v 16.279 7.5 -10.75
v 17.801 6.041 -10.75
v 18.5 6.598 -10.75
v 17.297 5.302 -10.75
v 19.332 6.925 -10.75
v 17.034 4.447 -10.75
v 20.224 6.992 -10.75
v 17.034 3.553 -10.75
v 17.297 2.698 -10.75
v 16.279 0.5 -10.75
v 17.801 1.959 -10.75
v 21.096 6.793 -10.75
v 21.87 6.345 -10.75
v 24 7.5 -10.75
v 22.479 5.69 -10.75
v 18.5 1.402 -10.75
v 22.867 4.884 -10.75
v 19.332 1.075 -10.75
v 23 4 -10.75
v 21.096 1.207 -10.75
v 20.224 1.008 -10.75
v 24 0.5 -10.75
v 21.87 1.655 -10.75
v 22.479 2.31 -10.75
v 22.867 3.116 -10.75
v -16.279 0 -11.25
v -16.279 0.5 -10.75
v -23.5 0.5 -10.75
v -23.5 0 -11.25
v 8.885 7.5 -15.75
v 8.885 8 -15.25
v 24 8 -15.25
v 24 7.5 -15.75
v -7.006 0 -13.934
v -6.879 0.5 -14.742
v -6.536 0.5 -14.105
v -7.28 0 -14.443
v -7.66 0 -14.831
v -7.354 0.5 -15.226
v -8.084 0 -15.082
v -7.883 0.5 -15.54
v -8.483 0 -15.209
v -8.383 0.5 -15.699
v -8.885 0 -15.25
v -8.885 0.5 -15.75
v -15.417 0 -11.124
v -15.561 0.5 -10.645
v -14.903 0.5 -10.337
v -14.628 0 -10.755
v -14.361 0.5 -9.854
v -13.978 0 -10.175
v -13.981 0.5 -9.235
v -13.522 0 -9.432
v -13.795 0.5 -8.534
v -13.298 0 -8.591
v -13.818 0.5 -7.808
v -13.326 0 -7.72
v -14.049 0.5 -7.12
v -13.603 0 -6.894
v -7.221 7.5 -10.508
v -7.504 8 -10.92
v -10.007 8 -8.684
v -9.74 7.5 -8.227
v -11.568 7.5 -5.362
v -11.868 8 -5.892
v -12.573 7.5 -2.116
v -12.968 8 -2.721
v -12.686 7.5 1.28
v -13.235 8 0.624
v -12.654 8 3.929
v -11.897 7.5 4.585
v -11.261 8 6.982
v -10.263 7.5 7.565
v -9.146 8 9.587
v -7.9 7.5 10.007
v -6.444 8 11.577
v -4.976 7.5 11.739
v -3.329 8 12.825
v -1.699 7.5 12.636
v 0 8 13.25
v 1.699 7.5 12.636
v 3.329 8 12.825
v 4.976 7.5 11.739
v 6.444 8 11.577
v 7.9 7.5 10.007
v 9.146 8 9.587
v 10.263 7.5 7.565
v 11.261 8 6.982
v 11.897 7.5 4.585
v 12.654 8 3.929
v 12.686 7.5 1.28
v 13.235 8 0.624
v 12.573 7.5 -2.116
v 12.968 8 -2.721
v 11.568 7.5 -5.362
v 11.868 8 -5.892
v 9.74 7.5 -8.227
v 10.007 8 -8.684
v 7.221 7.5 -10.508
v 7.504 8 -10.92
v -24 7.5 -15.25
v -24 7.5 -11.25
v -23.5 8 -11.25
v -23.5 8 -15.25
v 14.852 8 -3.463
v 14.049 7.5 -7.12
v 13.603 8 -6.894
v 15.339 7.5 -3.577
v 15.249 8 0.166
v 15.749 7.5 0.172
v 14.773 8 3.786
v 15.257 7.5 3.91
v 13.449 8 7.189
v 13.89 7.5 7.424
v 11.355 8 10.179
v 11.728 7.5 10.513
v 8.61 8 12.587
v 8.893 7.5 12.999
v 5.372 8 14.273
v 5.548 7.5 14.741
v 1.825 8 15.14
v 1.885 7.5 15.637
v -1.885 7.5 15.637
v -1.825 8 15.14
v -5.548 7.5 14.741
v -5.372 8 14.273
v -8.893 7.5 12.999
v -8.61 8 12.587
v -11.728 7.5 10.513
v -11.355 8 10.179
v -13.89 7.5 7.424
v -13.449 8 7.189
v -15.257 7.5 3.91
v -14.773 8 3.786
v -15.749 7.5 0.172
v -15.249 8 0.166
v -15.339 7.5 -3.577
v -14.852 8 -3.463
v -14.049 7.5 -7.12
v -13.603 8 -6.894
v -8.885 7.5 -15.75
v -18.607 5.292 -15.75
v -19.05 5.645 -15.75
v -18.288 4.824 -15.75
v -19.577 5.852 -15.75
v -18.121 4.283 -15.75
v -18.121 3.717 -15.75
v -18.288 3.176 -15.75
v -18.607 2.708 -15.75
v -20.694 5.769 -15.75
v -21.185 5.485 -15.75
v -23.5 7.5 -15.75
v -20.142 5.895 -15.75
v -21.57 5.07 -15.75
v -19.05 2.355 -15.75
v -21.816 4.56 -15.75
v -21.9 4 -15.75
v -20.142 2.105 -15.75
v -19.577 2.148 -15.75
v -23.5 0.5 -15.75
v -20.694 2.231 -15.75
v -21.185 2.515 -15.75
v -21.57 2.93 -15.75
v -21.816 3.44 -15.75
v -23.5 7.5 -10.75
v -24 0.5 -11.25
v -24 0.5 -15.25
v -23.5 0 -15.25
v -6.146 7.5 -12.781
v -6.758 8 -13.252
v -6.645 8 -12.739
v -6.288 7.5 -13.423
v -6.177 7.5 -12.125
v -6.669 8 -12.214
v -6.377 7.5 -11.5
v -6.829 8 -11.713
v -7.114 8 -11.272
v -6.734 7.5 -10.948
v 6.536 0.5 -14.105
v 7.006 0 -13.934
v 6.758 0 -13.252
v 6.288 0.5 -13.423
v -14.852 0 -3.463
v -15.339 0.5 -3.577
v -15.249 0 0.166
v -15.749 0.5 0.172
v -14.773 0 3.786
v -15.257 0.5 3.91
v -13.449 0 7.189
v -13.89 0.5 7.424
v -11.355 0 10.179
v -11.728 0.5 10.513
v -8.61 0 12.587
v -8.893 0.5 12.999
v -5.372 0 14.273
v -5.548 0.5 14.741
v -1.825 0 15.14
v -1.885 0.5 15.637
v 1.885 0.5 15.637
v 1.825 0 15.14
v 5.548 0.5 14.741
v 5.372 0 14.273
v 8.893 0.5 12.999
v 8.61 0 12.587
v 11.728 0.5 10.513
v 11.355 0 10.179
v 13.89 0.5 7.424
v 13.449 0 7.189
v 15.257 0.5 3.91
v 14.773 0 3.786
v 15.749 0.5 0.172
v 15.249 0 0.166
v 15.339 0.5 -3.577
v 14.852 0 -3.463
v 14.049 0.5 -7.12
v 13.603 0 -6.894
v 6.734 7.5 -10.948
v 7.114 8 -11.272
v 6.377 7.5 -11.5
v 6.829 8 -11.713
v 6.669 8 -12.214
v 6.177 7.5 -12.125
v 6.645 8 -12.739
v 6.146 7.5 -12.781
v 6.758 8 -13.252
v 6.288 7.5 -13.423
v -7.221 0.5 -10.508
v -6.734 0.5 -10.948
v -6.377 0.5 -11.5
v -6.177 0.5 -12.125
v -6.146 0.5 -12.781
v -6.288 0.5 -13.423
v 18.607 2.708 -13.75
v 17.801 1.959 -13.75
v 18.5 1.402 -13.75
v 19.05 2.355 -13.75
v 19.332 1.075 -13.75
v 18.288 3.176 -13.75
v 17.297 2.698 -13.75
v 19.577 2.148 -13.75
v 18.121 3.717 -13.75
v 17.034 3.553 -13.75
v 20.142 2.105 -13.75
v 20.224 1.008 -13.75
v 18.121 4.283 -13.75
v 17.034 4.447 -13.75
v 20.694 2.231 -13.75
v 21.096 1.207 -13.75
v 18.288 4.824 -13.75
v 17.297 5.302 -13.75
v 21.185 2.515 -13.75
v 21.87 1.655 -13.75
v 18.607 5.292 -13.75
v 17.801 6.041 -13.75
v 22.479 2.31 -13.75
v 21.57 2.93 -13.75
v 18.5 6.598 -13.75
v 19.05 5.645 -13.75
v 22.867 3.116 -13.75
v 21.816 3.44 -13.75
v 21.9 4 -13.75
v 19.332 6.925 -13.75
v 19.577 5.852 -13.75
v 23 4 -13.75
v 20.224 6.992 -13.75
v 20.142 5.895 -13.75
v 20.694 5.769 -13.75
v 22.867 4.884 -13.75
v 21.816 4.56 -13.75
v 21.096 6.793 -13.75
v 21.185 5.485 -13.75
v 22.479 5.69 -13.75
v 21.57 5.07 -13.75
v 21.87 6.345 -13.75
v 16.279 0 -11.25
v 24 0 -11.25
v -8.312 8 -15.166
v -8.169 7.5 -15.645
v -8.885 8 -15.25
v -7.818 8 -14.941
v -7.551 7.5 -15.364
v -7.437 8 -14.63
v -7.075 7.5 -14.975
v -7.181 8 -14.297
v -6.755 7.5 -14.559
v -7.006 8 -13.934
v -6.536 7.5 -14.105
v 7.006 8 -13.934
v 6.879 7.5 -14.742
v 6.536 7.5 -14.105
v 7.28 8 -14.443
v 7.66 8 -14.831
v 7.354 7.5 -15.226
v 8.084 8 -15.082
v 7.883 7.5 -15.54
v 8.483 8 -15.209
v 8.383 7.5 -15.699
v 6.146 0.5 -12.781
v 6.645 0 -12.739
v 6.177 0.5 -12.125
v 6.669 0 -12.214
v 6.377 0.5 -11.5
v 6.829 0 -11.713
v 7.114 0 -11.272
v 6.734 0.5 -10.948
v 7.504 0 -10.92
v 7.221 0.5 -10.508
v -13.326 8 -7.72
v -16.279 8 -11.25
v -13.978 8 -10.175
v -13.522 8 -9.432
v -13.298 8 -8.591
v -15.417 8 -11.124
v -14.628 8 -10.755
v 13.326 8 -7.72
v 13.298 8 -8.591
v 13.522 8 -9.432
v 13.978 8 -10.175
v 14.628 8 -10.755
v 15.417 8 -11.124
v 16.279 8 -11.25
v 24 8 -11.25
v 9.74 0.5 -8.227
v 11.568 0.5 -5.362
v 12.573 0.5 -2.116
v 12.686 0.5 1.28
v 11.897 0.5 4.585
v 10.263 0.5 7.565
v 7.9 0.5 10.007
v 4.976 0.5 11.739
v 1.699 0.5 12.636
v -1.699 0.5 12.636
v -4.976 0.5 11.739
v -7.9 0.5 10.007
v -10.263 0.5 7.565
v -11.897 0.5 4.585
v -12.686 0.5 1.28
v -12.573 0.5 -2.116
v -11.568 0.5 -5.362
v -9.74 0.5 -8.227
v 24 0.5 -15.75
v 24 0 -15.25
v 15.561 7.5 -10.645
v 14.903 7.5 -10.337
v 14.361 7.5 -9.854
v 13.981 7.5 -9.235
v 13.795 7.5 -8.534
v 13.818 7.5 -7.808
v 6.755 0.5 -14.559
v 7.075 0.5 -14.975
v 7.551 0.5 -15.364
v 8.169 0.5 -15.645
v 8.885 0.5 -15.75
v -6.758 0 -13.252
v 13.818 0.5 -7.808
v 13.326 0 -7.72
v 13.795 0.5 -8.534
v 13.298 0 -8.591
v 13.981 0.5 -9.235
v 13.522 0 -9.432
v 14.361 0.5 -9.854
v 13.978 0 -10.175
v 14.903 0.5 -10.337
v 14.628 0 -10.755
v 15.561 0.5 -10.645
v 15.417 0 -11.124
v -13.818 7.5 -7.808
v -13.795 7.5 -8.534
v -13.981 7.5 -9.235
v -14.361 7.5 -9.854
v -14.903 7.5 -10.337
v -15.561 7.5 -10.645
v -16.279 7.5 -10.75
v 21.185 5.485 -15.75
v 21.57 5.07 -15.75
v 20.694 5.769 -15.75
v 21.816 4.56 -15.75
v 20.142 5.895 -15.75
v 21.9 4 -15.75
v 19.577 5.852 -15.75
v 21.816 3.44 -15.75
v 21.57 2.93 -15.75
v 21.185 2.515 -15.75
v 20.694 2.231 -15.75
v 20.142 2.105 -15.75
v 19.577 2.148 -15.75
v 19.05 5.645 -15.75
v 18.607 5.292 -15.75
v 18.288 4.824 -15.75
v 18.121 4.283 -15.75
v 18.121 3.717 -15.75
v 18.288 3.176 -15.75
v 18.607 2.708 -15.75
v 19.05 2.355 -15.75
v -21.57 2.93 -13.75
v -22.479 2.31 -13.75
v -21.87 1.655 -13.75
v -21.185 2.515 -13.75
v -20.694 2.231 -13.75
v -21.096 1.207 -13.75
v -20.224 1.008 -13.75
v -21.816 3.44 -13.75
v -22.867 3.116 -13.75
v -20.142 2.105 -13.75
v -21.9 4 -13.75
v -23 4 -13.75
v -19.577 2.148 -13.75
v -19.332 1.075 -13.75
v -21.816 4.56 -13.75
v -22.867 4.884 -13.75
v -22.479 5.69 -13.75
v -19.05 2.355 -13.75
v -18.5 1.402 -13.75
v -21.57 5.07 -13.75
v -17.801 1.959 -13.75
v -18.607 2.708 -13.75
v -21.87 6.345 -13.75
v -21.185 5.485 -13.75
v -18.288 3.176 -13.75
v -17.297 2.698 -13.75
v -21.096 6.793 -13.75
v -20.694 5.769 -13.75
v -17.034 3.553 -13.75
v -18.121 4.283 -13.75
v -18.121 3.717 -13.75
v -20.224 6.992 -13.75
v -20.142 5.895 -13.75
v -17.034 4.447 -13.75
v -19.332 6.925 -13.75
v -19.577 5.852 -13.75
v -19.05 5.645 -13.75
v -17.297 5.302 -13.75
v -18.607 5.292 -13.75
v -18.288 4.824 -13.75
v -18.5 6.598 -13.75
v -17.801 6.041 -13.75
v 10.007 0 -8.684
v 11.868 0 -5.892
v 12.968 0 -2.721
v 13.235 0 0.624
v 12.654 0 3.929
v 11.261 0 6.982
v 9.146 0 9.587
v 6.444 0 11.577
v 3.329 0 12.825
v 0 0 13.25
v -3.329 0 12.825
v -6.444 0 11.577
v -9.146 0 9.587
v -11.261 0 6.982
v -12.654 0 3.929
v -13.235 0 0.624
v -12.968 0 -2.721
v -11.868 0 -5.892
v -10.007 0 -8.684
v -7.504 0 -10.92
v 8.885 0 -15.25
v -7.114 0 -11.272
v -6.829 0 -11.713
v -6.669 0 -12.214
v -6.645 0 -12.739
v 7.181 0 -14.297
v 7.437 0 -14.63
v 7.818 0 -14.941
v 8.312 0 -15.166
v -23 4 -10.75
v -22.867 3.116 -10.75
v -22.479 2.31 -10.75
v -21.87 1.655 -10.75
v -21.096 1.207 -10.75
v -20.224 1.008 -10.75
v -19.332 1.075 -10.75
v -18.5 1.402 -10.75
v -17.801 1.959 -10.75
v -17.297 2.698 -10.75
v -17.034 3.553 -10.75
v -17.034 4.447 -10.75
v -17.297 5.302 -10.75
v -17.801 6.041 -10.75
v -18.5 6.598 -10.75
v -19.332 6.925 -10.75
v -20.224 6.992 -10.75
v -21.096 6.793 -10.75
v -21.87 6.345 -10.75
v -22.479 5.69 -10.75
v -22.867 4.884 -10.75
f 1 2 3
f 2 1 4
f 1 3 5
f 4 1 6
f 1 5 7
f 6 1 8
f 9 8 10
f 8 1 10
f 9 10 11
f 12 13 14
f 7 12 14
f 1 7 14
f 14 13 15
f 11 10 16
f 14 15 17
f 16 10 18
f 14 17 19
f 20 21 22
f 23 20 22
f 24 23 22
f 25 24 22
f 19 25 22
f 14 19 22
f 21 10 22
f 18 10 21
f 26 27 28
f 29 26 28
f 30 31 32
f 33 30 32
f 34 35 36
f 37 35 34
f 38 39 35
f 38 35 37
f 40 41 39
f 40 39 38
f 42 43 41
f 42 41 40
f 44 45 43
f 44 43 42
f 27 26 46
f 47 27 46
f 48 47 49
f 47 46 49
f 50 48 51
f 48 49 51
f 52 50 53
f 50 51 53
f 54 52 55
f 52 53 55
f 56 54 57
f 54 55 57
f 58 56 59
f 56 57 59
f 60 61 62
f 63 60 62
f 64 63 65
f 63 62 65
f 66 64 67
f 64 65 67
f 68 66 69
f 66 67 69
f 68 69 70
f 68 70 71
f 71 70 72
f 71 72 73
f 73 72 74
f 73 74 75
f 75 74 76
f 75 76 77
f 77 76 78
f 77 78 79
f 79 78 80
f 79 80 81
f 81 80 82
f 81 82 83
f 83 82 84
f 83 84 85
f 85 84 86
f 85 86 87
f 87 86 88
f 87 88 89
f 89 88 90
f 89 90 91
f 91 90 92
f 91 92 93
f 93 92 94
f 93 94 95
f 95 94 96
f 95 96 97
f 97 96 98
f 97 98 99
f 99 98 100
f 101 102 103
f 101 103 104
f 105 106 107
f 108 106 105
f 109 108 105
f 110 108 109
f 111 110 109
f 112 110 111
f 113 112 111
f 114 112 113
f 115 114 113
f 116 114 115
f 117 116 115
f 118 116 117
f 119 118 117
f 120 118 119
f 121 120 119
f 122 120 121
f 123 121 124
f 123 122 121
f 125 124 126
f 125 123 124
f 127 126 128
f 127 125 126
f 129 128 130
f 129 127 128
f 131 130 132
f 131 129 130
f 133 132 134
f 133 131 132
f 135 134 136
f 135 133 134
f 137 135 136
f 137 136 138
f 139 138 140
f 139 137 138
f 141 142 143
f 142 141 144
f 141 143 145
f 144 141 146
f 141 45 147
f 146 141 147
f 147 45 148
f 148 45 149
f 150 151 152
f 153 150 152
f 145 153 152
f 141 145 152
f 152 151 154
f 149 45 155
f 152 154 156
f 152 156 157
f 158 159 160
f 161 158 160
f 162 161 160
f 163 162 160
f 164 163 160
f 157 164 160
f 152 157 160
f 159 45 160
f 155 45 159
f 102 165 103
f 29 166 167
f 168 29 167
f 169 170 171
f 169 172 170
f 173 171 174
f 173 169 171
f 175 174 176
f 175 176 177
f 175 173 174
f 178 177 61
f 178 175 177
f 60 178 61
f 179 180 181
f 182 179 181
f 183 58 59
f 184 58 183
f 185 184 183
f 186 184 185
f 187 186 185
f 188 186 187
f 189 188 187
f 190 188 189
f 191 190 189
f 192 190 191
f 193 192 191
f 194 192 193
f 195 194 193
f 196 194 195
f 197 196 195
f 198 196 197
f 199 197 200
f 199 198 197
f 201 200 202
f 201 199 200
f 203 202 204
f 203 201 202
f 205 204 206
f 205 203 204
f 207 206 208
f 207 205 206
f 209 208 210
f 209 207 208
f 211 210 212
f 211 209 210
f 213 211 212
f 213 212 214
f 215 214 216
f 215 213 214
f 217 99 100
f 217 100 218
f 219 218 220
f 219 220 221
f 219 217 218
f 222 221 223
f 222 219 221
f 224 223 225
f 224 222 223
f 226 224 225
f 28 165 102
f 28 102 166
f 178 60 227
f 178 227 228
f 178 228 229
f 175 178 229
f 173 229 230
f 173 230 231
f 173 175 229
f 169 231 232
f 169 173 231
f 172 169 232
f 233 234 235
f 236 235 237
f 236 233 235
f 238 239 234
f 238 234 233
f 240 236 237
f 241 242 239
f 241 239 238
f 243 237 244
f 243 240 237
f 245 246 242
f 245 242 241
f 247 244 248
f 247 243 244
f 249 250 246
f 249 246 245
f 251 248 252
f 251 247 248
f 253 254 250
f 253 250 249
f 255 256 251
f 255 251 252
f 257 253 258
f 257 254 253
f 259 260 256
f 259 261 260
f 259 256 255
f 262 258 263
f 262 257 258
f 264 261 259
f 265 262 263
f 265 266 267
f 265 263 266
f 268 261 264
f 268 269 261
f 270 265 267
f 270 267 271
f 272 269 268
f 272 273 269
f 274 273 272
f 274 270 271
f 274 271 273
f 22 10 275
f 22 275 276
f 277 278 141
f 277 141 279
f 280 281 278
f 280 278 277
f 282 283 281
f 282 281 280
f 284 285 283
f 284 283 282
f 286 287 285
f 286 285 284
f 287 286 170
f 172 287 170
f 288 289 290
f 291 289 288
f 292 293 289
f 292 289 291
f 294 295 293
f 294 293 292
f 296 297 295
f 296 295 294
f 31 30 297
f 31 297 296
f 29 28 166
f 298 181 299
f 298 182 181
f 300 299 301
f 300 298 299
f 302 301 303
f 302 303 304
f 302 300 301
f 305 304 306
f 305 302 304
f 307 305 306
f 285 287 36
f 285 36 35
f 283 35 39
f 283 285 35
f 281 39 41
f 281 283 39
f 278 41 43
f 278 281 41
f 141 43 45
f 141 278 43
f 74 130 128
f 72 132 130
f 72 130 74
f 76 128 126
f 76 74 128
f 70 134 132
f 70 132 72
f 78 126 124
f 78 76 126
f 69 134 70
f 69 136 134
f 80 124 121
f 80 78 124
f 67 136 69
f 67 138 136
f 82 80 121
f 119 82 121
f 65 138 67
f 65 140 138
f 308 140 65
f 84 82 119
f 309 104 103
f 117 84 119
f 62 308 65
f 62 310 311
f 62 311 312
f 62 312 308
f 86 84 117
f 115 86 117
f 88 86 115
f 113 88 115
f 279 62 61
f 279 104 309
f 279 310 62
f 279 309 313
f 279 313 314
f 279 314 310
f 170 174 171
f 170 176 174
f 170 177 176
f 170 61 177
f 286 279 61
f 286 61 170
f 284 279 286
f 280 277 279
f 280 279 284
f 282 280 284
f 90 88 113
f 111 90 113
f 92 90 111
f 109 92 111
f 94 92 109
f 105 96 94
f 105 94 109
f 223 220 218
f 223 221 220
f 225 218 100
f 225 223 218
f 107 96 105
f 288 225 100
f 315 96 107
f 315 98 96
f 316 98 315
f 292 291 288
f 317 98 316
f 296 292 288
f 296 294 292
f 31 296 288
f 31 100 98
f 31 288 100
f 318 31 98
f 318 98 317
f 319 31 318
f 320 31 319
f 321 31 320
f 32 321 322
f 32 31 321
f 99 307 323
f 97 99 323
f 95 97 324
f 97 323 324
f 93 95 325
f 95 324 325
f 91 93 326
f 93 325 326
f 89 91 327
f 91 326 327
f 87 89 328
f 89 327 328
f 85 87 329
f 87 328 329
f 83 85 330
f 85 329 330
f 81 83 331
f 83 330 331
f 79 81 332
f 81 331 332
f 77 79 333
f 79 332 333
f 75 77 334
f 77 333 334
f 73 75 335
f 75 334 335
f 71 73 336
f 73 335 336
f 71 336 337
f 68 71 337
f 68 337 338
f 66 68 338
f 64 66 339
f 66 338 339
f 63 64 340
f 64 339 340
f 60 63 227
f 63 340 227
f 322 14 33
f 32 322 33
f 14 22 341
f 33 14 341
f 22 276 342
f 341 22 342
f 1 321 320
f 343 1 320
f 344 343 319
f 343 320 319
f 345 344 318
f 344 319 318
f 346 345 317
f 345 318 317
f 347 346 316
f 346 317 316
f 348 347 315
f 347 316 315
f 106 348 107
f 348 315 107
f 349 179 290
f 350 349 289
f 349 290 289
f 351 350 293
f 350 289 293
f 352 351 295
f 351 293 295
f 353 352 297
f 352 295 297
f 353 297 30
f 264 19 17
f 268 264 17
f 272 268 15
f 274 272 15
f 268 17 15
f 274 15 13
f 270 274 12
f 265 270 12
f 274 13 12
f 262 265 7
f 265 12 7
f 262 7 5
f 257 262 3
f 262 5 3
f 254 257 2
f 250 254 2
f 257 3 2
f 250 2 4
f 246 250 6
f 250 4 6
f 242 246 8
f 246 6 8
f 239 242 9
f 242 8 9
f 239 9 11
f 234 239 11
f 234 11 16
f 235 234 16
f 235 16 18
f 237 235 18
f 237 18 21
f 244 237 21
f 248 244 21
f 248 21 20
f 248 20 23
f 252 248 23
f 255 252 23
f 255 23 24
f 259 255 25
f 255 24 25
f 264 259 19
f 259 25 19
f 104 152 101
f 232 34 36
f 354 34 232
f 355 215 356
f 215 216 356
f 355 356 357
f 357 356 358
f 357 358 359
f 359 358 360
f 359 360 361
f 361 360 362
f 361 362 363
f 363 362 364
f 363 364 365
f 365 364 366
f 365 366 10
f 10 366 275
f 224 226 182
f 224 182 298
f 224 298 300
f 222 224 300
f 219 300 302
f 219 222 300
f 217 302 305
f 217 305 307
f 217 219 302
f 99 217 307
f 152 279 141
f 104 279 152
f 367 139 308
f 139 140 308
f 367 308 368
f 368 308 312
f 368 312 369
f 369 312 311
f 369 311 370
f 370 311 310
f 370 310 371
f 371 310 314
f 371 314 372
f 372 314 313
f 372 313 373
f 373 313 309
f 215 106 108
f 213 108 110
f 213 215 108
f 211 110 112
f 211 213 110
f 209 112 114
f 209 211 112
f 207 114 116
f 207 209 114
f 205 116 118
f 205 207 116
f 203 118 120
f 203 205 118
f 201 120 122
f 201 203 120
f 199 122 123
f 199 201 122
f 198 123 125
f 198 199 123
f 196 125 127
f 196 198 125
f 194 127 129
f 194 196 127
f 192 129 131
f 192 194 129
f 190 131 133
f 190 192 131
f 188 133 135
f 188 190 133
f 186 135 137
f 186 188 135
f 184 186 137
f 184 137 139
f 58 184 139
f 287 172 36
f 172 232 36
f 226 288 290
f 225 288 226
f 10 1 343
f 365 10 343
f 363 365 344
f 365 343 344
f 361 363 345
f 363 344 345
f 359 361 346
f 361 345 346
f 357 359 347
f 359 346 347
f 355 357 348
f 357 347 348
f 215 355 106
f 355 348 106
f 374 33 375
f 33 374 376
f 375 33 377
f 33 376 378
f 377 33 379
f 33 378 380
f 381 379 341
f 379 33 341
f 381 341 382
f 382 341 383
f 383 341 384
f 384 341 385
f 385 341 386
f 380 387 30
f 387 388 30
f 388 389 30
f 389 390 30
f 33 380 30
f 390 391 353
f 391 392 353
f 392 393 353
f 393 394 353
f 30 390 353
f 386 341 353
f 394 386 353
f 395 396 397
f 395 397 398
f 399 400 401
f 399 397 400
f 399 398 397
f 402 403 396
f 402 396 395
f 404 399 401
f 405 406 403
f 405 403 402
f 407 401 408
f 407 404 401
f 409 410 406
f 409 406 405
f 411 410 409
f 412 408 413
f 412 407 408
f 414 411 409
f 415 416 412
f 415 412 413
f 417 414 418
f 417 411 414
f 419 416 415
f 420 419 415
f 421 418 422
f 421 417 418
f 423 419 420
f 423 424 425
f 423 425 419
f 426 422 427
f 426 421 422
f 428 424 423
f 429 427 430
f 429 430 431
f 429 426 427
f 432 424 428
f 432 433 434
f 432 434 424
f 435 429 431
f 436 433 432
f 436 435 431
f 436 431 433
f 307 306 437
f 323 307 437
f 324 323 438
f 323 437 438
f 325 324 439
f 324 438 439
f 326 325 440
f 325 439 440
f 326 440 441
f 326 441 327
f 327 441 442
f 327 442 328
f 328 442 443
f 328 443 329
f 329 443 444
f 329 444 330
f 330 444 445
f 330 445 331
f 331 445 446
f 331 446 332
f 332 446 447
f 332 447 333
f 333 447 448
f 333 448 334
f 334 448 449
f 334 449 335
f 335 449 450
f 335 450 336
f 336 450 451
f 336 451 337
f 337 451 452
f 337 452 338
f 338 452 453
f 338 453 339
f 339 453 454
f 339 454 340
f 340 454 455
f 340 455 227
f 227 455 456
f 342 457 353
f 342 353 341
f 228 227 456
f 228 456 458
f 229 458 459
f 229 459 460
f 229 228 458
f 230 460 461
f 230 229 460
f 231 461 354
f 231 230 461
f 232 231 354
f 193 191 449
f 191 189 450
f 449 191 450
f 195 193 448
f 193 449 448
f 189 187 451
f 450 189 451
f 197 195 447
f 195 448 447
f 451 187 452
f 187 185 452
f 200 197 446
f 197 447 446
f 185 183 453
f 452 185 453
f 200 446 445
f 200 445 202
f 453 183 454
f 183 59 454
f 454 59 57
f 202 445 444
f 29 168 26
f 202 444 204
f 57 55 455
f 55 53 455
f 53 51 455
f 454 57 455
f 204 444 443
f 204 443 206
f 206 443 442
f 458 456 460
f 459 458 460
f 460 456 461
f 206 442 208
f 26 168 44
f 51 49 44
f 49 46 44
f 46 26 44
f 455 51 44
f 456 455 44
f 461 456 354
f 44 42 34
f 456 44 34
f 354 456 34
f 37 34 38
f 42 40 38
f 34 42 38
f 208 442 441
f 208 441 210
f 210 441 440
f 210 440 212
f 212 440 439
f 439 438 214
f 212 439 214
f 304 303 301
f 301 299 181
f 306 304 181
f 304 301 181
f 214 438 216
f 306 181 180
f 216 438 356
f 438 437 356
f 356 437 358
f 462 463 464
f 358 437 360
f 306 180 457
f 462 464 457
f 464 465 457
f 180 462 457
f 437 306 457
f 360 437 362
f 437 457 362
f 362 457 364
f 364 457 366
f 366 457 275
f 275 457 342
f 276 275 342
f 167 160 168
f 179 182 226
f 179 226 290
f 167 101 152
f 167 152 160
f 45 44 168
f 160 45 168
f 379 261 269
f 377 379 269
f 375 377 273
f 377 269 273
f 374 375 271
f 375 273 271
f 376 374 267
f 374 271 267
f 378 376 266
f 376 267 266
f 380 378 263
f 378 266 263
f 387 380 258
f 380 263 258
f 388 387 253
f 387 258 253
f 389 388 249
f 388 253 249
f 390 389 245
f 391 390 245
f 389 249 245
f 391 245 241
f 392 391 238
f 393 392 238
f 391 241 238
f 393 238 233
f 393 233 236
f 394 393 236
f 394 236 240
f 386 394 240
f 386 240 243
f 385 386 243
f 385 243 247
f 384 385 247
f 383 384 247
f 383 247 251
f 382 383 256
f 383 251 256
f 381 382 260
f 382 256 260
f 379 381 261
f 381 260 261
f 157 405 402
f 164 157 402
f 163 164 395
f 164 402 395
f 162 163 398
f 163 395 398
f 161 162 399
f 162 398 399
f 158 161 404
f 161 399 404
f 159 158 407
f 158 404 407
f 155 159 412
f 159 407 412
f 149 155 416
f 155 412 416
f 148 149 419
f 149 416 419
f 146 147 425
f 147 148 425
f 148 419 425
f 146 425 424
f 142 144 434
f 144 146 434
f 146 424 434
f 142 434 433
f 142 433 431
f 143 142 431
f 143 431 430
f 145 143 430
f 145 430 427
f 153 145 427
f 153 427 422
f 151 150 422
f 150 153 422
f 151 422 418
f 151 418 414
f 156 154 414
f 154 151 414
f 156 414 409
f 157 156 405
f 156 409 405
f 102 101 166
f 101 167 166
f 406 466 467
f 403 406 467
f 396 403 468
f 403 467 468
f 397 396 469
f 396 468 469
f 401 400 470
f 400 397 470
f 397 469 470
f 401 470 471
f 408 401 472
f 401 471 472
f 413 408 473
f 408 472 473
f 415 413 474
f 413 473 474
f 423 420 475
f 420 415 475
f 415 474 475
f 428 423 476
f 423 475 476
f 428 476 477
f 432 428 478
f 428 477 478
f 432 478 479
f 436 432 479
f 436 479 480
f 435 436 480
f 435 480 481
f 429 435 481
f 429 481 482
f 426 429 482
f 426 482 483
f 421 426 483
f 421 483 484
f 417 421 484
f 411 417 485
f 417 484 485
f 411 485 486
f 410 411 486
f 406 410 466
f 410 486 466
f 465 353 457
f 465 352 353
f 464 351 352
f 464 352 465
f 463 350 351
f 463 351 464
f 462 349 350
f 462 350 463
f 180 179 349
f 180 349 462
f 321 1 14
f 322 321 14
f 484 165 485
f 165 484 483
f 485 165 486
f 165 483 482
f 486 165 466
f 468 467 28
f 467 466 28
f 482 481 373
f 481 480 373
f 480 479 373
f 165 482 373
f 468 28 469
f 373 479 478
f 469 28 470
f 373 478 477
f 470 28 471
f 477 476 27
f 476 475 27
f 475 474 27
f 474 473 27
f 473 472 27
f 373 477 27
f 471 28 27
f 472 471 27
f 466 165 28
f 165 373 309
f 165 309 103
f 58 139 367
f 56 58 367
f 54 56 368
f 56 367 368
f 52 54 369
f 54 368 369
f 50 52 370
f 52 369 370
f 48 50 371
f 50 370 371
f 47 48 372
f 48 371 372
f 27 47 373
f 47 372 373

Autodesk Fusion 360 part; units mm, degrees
sketch "Sketch1" plane through (0, 0, 0) normal (0, 1, 0) x (1, 0, 0)
  circle A0 centre (0, 0) radius 12.75
  circle A1 centre (0, 0) radius 15.75
  line L0 (0, 0) -> (0, 15.75)
  line L1 (24, 10.75) -> (24, 15.75)
  line L2 (24, 15.75) -> (0, 15.75)
  line L3 (11.5109, 10.75) -> (24, 10.75)
  line L4 (0, 12.75) -> (0, 15.75)
  line L5 (5.5761, 11.466) -> (6.606, 14.2976)
  line L6 (-5.5761, 11.466) -> (-6.606, 14.2976)
  line L7 (6.606, 14.2976) -> (7.1343, 15.75)
  dimension "d1" = 25.5
  dimension "d2" = 3
  dimension "d3" = 24
  dimension "d4" = 5
  dimension "d5" = 12.4891
extrude "Extrude1" add sketch "Sketch1" along normal blind 8 contours A0 A1 L5 L6 makes body 1
extrude "Extrude2" add sketch "Sketch1" along normal blind 8 separate body contours A1 L1 L2 L3 L7 makes body 2
sketch "Sketch2" plane through (0, 0, -10.75) normal (0, 0, 1) x (1, 0, 0)
  line L0 (11.5109, 0) -> (24, 0)
  line L1 (24, 0) -> (24, 8)
  line L2 (24, 8) -> (11.5109, 8)
  line L3 (11.5109, 8) -> (11.5109, 0)
  circle A0 centre (20, 4) radius 3
  circle A1 centre (20, 4) radius 1.9
  line L4 (0, 0) -> (0, 7)
  line L5 (24, 4) -> (20, 4)
  dimension "d10" = 20
  dimension "d11" = 3.8
  dimension "d12" = 6
extrude "Extrude3" cut sketch "Sketch2" against normal blind 9 contours A1 bodies 2
extrude "Extrude4" cut sketch "Sketch2" against normal blind 3 contours A0 bodies 2
mirror "Mirror1" about plane through (0, 0, 0) normal (1, 0, 0) of bodies 2 makes body 3
combine "Combine1" operation add target body 3 tool bodies 1 2
fillet "Fillet1" radius 2.5 6 edges at (11.5109, 4, -10.75) (-11.5109, 4, -10.75) (-5.5761, 4, -11.466) (5.5761, 4, -11.466) (7.1343, 4, -15.75) (-7.1343, 4, -15.75) on bodies 3
chamfer "Chamfer1" distance 0.5 angle 45 28 edges at (0, 8, 15.75) (14.1486, 8, -9.5586) (20.1394, 8, -10.75) (-20.1394, 8, -10.75) (-14.1486, 8, -9.5586) (0, 8, 12.75) (-6.2564, 8, -11.8057) (-6.4118, 8, -13.7636) (-7.451, 8, -15.2977) (-16.4426, 8, -15.75) (16.4426, 8, -15.75) (7.451, 8, -15.2977) (6.4118, 8, -13.7636) (6.2564, 8, -11.8057) (0, 0, 15.75) (14.1486, 0, -9.5586) (20.1394, 0, -10.75) (-20.1394, 0, -10.75) (-14.1486, 0, -9.5586) (0, 0, 12.75) (6.2564, 0, -11.8057) (6.4118, 0, -13.7636) (7.451, 0, -15.2977) (16.4426, 0, -15.75) (-16.4426, 0, -15.75) (-7.451, 0, -15.2977) (-6.4118, 0, -13.7636) (-6.2564, 0, -11.8057) 2 faces at (-24, 5.3333, -12.4167) (-24, 5.3333, -12.4167) on bodies 3
equation "d15 = -5.00 mm + 2 mm"
